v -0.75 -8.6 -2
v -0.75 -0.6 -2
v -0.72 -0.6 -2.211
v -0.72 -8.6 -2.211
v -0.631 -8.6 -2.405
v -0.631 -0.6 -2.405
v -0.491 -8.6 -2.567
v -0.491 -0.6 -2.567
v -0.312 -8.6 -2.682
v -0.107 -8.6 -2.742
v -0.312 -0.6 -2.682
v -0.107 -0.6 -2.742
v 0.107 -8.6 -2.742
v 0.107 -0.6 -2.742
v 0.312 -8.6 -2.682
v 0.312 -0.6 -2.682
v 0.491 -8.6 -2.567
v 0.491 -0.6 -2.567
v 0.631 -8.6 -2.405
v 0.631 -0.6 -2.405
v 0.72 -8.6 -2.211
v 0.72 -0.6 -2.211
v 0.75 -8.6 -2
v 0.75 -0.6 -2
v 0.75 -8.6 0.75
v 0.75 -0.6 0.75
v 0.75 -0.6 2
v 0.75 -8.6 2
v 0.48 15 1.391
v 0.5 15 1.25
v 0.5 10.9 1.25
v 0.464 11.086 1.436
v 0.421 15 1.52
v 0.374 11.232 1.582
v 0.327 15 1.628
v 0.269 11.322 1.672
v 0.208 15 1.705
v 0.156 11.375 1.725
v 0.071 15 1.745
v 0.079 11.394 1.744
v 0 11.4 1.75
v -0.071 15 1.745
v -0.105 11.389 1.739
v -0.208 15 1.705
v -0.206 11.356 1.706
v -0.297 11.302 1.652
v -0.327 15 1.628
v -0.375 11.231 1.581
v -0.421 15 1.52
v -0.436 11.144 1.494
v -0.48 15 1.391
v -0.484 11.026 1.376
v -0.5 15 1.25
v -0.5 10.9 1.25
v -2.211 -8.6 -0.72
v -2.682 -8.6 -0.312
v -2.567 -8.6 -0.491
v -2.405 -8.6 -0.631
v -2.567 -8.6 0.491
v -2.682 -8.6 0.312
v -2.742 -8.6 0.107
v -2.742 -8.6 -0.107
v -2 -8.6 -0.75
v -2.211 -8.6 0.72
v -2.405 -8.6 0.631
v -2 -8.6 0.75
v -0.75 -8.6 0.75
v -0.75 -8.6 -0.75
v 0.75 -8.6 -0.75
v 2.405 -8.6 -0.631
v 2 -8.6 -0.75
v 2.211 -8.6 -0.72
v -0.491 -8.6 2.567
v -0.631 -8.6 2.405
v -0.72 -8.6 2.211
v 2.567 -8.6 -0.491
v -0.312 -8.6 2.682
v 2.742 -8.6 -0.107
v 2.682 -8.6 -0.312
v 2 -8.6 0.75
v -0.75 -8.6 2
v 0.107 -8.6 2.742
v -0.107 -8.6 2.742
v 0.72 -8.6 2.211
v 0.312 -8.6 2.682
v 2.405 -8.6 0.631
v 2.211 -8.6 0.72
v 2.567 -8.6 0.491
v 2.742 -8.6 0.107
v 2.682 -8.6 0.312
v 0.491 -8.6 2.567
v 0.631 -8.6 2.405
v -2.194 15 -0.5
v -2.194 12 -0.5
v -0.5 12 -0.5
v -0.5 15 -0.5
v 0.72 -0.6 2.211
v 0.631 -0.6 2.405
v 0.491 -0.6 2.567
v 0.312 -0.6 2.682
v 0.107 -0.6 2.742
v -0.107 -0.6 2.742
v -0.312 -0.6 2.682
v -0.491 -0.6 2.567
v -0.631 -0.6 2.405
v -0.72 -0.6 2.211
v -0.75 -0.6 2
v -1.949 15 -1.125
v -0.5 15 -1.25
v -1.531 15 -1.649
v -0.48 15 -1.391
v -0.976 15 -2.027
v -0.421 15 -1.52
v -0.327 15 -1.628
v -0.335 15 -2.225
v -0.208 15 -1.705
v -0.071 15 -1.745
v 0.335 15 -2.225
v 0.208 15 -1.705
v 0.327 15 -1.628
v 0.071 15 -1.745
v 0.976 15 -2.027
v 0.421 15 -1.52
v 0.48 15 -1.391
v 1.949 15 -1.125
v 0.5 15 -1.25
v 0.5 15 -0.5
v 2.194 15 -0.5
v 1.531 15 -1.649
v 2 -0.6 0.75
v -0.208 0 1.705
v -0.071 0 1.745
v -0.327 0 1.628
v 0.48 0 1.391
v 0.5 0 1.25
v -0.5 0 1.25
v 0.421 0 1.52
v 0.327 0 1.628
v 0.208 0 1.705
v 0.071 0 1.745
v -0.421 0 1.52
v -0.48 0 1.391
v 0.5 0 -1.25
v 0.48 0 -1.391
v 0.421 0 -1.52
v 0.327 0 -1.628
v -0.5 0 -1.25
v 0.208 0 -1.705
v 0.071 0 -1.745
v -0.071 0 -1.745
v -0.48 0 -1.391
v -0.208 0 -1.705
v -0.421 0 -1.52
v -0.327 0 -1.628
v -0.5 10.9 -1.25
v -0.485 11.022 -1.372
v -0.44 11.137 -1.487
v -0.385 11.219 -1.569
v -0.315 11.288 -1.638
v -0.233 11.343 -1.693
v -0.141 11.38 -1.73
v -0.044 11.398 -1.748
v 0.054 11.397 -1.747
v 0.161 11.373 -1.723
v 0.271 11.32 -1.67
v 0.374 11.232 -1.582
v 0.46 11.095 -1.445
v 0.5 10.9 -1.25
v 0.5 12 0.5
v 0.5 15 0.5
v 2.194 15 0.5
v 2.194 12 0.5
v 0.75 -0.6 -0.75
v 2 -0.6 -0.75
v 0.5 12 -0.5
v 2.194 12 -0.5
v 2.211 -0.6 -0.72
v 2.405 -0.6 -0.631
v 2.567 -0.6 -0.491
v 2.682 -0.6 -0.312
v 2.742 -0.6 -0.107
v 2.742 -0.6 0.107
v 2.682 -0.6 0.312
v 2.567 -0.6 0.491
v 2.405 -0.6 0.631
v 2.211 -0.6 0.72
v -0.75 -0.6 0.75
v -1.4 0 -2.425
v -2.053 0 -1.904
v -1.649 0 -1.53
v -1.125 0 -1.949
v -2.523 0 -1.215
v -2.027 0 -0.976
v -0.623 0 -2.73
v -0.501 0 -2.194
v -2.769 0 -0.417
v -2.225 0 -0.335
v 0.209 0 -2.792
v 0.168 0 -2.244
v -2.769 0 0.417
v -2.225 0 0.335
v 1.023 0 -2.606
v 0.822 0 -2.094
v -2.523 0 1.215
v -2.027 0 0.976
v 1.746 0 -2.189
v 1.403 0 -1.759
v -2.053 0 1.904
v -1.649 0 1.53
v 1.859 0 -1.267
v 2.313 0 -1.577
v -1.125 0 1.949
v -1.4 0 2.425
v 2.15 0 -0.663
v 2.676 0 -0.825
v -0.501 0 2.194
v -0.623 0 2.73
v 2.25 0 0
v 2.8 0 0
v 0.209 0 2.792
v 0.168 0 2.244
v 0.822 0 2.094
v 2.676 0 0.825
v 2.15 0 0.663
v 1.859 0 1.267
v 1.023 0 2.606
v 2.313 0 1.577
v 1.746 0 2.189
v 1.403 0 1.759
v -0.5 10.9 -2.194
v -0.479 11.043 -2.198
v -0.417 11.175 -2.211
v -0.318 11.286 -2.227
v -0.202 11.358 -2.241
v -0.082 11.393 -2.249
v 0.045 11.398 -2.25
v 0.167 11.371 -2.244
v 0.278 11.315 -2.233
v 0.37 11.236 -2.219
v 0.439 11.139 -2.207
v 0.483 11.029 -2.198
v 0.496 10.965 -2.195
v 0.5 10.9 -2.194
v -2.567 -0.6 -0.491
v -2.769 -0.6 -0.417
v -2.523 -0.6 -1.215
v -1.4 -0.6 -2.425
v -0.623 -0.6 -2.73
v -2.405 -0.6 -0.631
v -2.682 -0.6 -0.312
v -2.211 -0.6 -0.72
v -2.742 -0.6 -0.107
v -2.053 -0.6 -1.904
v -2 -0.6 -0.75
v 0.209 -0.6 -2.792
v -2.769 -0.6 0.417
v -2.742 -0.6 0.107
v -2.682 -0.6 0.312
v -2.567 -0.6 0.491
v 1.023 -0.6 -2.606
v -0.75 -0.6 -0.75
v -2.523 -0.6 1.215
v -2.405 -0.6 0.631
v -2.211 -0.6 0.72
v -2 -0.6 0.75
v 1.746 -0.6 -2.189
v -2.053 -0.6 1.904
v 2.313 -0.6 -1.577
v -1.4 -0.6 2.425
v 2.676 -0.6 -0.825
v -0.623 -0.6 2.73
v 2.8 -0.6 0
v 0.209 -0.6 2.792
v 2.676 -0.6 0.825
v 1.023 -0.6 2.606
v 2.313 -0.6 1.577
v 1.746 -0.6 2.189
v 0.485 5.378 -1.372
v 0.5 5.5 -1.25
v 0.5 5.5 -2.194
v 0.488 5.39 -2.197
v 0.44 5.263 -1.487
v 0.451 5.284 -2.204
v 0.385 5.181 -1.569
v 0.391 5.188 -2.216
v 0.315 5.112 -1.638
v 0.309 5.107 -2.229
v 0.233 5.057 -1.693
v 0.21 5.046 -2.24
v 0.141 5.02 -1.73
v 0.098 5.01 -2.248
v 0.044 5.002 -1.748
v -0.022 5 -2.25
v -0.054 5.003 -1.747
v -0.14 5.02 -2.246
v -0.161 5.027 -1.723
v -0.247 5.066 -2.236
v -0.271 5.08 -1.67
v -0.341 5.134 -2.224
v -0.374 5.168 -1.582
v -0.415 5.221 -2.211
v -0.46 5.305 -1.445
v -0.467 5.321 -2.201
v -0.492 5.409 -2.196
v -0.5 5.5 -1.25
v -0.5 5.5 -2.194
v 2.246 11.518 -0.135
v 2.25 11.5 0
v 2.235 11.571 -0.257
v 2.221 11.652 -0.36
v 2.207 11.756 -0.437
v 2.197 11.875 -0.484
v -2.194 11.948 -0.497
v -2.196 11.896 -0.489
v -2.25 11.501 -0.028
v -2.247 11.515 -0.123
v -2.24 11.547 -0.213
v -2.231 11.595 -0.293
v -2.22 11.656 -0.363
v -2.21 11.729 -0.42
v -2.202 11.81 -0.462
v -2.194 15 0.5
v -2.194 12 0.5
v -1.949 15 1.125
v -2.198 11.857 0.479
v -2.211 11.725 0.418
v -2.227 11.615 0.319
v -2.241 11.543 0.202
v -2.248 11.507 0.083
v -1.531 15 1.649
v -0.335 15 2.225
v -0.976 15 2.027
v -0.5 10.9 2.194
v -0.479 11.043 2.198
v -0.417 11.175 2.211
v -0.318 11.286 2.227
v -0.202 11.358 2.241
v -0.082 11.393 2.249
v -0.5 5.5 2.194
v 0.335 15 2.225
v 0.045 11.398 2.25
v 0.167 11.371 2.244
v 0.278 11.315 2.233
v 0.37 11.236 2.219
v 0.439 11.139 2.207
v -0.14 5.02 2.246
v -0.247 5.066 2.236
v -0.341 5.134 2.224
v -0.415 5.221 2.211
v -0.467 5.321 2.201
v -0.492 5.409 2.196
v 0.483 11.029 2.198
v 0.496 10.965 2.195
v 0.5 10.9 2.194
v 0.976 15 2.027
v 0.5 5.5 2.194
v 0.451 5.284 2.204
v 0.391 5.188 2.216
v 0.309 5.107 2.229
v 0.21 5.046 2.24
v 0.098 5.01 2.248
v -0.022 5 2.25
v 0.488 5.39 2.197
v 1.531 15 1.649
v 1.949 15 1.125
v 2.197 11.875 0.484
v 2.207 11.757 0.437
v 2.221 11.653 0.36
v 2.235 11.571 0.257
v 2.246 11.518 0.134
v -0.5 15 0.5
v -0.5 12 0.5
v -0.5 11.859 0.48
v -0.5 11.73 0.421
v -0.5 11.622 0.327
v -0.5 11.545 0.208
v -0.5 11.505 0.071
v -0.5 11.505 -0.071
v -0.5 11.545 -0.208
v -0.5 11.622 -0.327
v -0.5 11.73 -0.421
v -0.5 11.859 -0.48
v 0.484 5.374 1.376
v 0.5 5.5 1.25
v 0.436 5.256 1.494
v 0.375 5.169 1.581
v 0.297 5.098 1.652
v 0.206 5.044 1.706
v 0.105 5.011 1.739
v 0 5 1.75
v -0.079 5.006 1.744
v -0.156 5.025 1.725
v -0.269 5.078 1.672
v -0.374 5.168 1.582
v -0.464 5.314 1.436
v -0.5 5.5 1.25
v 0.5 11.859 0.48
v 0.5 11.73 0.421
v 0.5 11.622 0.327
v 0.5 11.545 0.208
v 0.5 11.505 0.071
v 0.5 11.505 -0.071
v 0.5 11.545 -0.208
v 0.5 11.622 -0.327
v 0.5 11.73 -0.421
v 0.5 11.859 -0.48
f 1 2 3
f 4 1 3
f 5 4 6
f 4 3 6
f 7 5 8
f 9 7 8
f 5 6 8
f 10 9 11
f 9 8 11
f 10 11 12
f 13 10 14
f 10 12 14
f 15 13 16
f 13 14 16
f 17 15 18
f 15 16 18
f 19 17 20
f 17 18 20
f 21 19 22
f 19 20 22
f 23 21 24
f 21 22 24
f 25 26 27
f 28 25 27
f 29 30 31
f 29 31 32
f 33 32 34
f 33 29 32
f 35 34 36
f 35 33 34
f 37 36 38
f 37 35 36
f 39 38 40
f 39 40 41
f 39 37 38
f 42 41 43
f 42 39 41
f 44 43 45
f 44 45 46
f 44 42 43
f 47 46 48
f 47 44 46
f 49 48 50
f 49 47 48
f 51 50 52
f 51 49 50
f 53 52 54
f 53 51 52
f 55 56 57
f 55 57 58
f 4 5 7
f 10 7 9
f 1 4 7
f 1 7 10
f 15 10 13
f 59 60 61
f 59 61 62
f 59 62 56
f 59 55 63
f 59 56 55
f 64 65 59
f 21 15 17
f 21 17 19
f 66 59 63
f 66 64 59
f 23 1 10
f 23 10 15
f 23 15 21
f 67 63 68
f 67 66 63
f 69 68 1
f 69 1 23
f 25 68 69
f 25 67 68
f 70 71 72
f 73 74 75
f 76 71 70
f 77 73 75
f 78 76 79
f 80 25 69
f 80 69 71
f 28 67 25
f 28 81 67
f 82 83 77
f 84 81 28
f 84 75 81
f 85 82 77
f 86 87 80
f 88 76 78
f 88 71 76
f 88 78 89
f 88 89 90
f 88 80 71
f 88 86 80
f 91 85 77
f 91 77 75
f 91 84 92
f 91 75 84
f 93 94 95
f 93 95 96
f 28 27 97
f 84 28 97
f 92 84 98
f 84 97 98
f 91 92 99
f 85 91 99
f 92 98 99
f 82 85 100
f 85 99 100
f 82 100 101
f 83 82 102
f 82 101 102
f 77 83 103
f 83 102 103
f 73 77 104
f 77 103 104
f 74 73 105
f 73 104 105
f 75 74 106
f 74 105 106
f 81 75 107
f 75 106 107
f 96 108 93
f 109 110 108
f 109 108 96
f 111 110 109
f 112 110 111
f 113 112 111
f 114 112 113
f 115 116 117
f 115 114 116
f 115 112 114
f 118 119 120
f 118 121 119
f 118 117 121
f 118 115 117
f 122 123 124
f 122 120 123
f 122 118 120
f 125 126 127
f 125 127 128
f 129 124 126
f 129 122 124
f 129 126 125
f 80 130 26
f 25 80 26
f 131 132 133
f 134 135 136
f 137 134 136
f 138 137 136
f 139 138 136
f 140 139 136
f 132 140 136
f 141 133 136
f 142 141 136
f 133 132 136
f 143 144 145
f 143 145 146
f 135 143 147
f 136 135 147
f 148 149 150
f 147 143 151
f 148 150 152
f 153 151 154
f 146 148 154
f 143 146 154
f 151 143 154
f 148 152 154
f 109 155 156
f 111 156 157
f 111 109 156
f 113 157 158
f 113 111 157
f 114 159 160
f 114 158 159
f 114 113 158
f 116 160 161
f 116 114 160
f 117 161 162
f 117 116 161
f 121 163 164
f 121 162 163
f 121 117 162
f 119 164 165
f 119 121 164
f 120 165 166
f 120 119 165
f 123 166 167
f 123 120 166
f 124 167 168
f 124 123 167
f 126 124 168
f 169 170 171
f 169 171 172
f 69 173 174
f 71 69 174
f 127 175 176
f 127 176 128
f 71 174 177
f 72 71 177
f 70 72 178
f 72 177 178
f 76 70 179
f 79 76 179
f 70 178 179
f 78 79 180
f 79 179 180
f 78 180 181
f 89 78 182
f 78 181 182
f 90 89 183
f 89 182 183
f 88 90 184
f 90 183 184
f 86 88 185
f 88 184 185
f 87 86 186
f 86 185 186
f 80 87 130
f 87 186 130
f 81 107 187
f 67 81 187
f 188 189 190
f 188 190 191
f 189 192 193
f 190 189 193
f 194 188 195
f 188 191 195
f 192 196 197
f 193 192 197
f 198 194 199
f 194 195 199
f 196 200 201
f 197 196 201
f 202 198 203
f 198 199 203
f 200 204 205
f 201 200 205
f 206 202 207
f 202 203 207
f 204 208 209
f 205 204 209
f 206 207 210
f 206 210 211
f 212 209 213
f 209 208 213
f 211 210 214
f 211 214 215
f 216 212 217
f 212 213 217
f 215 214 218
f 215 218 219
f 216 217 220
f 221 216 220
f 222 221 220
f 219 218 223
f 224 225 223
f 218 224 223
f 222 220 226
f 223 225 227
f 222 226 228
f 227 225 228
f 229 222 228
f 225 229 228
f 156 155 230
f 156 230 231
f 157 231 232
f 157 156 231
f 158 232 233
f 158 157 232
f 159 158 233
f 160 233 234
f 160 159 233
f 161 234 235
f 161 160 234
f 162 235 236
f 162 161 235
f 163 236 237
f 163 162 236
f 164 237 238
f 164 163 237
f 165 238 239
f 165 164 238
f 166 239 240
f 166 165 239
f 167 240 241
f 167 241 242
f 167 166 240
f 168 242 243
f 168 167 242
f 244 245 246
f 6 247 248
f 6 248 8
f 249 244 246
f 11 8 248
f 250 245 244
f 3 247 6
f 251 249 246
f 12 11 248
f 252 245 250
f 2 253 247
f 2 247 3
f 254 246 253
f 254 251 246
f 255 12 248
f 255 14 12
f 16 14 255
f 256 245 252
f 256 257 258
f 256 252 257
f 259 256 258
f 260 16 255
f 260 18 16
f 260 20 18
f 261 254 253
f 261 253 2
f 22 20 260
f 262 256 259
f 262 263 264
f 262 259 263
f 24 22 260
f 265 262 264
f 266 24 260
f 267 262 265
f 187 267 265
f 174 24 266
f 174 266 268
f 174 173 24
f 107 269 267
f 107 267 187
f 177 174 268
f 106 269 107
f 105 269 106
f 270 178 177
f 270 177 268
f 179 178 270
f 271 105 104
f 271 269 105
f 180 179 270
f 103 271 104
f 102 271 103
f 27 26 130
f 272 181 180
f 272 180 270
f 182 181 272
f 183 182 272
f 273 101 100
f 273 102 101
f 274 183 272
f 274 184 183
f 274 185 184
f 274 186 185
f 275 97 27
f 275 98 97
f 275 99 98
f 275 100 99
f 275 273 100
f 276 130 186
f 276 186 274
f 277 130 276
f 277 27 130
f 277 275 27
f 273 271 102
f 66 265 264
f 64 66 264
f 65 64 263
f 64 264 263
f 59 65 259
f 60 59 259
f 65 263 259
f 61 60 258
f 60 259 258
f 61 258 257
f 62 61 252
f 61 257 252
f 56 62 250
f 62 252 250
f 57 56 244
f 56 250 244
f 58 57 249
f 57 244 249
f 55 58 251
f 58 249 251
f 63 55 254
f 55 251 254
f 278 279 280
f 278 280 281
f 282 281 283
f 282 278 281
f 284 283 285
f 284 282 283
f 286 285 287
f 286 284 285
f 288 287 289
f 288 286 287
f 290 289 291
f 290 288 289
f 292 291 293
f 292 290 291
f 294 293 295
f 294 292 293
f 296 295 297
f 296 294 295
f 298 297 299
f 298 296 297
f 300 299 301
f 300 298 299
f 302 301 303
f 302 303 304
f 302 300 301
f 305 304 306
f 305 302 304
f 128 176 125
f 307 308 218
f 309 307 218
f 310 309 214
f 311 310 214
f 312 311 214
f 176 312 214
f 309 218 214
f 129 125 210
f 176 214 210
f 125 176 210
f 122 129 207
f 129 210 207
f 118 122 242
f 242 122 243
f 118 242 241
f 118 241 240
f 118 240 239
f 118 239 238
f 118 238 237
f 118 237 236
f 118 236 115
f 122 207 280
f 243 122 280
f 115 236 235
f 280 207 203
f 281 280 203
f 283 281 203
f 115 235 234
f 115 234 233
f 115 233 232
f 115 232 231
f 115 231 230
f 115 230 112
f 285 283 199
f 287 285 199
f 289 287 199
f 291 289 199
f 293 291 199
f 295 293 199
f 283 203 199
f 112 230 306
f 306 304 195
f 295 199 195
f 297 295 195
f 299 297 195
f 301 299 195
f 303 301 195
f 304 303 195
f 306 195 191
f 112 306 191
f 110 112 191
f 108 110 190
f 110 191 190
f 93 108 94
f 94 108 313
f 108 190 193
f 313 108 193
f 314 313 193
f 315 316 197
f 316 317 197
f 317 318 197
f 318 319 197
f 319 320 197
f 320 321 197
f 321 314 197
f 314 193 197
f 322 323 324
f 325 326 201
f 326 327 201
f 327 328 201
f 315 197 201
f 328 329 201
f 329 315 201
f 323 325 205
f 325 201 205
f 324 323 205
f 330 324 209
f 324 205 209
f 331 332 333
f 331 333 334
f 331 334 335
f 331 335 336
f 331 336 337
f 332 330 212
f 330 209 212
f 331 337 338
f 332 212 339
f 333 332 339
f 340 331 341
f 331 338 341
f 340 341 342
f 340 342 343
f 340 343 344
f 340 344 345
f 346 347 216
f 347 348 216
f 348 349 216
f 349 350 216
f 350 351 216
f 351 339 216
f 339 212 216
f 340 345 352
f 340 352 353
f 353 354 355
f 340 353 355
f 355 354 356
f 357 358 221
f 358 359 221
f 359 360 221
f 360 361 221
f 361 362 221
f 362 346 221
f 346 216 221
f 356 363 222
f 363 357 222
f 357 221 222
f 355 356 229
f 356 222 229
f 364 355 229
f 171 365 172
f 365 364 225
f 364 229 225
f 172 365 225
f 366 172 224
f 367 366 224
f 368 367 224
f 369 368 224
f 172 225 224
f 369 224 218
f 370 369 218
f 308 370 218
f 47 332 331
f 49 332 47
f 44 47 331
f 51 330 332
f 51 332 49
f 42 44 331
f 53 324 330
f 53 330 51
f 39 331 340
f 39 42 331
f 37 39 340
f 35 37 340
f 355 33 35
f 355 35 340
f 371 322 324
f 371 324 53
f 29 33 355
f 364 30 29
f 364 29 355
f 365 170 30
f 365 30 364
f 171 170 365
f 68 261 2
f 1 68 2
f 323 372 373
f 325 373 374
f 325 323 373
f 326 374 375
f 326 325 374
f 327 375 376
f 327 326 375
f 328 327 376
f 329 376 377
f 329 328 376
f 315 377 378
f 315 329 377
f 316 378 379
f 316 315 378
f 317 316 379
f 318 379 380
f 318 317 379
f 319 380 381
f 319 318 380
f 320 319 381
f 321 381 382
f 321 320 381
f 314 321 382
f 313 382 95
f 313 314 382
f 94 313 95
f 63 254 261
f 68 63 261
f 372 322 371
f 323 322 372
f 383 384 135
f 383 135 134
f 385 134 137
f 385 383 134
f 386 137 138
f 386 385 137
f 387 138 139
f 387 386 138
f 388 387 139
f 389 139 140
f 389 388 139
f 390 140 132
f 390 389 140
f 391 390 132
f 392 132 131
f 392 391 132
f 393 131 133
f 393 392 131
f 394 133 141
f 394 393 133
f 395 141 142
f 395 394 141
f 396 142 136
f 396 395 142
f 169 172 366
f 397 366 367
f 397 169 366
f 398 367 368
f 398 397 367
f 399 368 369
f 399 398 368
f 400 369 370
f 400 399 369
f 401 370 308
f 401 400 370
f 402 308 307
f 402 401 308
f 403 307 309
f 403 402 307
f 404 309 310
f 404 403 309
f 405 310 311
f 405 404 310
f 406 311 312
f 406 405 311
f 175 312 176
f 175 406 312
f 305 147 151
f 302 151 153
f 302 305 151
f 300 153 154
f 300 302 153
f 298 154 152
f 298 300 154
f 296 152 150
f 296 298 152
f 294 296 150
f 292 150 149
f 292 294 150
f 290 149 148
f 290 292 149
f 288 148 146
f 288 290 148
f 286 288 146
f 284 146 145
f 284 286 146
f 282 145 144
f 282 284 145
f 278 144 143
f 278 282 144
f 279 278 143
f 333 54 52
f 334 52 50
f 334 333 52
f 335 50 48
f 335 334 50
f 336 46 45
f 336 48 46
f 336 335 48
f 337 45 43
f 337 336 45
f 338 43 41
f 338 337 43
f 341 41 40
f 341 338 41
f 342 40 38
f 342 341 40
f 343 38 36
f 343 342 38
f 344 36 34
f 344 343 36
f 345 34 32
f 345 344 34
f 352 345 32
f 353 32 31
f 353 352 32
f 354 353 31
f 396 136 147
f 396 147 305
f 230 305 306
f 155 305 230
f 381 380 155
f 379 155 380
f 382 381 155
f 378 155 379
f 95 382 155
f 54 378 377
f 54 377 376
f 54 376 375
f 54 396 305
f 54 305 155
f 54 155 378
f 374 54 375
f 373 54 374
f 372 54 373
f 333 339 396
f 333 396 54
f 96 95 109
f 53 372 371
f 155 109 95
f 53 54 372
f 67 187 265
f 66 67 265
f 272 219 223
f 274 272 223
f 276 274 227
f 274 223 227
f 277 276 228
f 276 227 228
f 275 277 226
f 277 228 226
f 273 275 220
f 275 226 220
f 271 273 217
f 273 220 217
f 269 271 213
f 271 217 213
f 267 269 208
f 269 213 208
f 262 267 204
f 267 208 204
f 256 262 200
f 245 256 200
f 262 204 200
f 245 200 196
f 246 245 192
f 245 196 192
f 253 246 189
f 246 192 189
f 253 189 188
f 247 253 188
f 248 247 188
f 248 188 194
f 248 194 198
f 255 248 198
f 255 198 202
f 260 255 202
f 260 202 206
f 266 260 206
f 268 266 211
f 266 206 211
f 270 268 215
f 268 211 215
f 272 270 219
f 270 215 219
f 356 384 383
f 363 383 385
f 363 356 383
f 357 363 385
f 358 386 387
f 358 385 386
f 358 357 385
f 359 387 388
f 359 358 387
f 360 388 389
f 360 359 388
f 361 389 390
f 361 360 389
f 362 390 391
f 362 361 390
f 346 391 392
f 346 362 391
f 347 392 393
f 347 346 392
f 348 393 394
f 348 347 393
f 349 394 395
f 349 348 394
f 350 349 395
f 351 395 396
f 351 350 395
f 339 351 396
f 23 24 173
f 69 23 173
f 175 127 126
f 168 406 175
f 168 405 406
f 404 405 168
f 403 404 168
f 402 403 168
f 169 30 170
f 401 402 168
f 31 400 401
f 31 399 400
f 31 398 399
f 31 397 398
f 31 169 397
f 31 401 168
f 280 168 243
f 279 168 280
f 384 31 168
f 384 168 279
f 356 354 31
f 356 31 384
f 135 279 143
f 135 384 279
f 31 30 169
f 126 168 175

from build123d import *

# Parameters (mm, degrees)
SKETCH1_R           = 2.25
BOSS_EXTRUDE1_DEPTH = 15
SKETCH2_R           = 2.8
BOSS_EXTRUDE2_DEPTH = 0.6
CUT_EXTRUDE1_DEPTH  = 6.05
CUT_EXTRUDE5_DEPTH  = 6.05
CUT_EXTRUDE6_DEPTH  = 100
SKETCH11_W          = 1.5
SKETCH11_H          = 1.5
BOSS_EXTRUDE3_DEPTH = 8


with BuildPart() as part:
    # Sketch1 → Boss-Extrude1 (new body)
    with BuildSketch(Plane(origin=(0, 0, 0), x_dir=(1, 0, 0), z_dir=(0, 1, 0))):
        Circle(SKETCH1_R)
    extrude(amount=BOSS_EXTRUDE1_DEPTH)

    # Sketch2 → Boss-Extrude2 (add)
    with BuildSketch(Plane.XZ):
        Circle(SKETCH2_R)
    extrude(amount=BOSS_EXTRUDE2_DEPTH)

    # Sketch3 → Cut-Extrude1 (cut, through all)
    with BuildSketch(Plane.ZY.offset(2.25)):
        with BuildLine():
            Line((-0.5, 12), (-0.5, 15))
            ThreePointArc((-0.5, 15), (0, 15.5), (0.5, 15))
            Line((0.5, 15), (0.5, 12))
            ThreePointArc((0.5, 12), (0, 11.5), (-0.5, 12))
        make_face()
    extrude(amount=-CUT_EXTRUDE1_DEPTH, mode=Mode.SUBTRACT)

    # Sketch6 → Cut-Extrude5 (cut, through all)
    with BuildSketch(Plane.XY.offset(2.25)):
        with BuildLine():
            Line((-0.5, 5.5), (-0.5, 10.9))
            ThreePointArc((-0.5, 10.9), (0, 11.4), (0.5, 10.9))
            Line((0.5, 10.9), (0.5, 5.5))
            ThreePointArc((0.5, 5.5), (0, 5), (-0.5, 5.5))
        make_face()
    extrude(amount=-CUT_EXTRUDE5_DEPTH, mode=Mode.SUBTRACT)

    # Sketch8 → Cut-Extrude6 (cut)
    with BuildSketch(Plane(origin=(0, 100, 0), x_dir=(1, 0, 0), z_dir=(0, 1, 0))):
        with BuildLine():
            Line((0.5, 1.25), (0.5, -1.25))
            ThreePointArc((0.5, -1.25), (0, -1.75), (-0.5, -1.25))
            Line((-0.5, -1.25), (-0.5, 1.25))
            ThreePointArc((-0.5, 1.25), (0, 1.75), (0.5, 1.25))
        make_face()
    extrude(amount=-CUT_EXTRUDE6_DEPTH, mode=Mode.SUBTRACT)

    # Sketch11 → Boss-Extrude3 (add)
    with BuildSketch(Plane.XZ.offset(0.6)):
        with BuildLine():
            Line((-0.75, 2), (-0.75, 0.75))
            Line((-0.75, 0.75), (0.75, 0.75))
            Line((0.75, 0.75), (0.75, 2))
            ThreePointArc((0.75, 2), (0, 2.75), (-0.75, 2))
        make_face()
        Rectangle(SKETCH11_W, SKETCH11_H)
        with BuildLine():
            Line((0.75, 0.75), (0.75, -0.75))
            Line((0.75, -0.75), (2, -0.75))
            ThreePointArc((2, -0.75), (2.75, 0), (2, 0.75))
            Line((2, 0.75), (0.75, 0.75))
        make_face()
        with BuildLine():
            Line((-2, -0.75), (-0.75, -0.75))
            Line((-0.75, -0.75), (-0.75, 0.75))
            Line((-0.75, 0.75), (-2, 0.75))
            ThreePointArc((-2, 0.75), (-2.75, 0), (-2, -0.75))
        make_face()
        with BuildLine():
            Line((-0.75, -0.75), (-0.75, -2))
            ThreePointArc((-0.75, -2), (0, -2.75), (0.75, -2))
            Line((0.75, -2), (0.75, -0.75))
            Line((0.75, -0.75), (-0.75, -0.75))
        make_face()
    extrude(amount=BOSS_EXTRUDE3_DEPTH)


solid = part.part
